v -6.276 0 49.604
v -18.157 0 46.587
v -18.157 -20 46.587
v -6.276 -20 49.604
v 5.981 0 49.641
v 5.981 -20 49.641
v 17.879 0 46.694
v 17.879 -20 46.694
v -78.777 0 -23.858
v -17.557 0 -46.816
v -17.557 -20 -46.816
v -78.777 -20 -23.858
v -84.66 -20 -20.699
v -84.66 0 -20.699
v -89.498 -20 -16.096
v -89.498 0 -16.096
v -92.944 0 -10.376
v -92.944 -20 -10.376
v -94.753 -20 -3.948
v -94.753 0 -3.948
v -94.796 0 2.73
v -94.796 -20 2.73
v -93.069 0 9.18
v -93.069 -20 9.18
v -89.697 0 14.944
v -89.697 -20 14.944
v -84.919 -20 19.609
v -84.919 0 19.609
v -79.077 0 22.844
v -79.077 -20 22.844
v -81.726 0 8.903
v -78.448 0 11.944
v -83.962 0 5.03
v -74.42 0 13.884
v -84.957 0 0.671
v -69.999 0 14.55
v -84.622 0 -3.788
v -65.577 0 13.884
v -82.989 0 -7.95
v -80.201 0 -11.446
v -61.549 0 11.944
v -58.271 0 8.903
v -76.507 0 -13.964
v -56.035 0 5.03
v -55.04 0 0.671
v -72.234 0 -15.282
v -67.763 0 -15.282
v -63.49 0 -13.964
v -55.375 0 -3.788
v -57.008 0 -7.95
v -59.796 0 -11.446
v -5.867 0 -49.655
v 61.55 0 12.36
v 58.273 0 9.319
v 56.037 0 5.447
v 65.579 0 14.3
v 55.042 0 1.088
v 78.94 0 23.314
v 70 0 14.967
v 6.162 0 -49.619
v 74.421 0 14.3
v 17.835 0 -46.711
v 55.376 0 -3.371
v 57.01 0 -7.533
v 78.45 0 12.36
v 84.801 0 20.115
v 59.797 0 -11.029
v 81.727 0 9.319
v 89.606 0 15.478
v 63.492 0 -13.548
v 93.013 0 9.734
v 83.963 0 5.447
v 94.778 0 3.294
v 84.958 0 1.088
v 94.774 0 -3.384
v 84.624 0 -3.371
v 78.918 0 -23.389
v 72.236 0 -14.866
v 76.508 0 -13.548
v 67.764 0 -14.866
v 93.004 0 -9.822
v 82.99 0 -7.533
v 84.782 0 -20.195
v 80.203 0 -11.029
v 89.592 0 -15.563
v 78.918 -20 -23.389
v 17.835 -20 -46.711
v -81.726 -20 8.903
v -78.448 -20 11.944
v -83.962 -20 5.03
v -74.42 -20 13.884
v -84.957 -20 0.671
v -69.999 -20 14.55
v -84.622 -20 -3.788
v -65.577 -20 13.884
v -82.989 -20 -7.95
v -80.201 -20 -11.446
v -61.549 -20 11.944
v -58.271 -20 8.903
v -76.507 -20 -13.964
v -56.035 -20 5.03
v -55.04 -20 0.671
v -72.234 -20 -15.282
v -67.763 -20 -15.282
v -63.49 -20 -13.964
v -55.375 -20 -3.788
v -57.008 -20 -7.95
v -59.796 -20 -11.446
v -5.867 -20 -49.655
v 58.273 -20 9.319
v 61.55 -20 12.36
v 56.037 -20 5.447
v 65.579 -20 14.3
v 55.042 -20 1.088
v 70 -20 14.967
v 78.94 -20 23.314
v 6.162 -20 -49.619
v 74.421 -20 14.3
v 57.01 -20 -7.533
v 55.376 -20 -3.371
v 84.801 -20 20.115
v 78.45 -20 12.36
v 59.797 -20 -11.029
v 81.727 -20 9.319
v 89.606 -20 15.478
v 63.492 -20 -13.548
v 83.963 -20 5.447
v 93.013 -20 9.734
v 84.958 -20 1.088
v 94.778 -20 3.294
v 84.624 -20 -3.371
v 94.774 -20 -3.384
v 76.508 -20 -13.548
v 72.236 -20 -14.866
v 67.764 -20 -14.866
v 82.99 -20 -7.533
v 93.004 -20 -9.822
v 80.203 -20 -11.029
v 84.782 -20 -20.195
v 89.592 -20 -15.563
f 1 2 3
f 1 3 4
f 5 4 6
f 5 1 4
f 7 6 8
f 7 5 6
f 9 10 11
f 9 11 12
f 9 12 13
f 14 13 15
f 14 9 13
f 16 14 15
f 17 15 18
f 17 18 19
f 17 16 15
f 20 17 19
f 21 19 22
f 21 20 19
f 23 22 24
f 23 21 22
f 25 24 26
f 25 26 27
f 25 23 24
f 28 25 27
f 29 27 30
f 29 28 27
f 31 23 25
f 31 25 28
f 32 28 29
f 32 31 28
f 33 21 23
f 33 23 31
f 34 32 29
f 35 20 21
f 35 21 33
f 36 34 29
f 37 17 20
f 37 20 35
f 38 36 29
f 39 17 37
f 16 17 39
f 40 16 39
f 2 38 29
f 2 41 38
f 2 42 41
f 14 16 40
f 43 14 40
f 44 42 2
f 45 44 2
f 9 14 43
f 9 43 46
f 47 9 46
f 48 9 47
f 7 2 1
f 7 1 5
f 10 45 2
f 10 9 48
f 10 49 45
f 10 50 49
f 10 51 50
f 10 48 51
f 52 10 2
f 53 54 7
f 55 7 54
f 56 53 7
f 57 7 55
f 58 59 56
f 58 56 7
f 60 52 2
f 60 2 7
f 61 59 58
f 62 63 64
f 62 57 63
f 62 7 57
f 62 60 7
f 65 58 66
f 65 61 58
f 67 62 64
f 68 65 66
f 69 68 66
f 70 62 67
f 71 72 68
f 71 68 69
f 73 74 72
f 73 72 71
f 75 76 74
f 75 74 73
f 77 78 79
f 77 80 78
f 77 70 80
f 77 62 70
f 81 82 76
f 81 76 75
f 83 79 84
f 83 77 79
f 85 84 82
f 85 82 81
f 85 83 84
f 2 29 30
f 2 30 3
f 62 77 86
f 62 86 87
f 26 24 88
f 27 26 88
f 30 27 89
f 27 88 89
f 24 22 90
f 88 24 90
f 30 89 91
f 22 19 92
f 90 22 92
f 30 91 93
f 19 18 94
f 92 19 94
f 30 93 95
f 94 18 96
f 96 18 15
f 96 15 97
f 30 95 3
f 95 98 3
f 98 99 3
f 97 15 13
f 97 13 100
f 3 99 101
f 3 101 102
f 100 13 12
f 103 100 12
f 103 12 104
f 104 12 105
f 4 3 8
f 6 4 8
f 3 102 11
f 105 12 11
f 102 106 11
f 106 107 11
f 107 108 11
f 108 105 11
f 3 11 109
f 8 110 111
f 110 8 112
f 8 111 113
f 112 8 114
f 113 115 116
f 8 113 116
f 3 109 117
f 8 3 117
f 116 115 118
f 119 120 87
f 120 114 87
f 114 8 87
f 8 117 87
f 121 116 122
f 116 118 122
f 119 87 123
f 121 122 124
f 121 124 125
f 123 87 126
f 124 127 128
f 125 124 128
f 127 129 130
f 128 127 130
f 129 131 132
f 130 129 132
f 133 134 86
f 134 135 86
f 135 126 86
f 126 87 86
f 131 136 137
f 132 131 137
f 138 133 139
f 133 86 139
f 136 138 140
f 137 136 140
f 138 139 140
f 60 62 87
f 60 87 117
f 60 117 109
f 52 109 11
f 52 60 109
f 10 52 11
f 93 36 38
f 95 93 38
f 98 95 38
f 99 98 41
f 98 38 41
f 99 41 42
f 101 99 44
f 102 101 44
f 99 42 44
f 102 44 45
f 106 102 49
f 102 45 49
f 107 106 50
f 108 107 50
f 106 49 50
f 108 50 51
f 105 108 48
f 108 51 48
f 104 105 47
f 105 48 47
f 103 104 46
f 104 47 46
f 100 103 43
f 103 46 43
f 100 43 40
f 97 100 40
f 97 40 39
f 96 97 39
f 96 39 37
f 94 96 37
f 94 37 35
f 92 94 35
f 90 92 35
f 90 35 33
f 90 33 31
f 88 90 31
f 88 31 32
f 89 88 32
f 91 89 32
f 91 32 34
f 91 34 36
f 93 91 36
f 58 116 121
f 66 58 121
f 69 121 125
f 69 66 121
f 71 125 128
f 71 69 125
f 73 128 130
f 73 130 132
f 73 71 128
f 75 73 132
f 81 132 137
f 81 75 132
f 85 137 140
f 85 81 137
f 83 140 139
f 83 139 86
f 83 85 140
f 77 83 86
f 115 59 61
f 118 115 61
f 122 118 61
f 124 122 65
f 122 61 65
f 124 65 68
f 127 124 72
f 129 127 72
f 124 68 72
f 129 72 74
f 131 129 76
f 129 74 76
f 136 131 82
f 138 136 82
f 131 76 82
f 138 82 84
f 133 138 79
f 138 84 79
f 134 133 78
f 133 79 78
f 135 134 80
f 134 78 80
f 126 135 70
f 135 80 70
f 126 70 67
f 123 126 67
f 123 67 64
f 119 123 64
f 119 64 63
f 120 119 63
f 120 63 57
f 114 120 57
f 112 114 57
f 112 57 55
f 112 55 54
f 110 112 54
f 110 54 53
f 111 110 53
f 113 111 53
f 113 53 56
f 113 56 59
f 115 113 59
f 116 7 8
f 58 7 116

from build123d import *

# Parameters (mm, degrees)
EXTRUDE_324_DEPTH  = 20
SKETCH1_R          = 15
CUT_EXTRUDE1_DEPTH = 110.201641513


with BuildPart() as part:
    # Эскиз1 → Extrude 324 (new body)
    with BuildSketch(Plane(origin=(0, 0, 0), x_dir=(-1, 0, 0), z_dir=(0, -1, 0))):
        with BuildLine():
            Line((-78.917505692, 23.388614652), (-17.835027079, 46.710938859))
            ThreePointArc((-17.835027079, 46.710938859), (-0.148812417, 49.999778548), (17.556665634, 46.816273793))
            Line((17.556665634, 46.816273793), (78.776887546, 23.857954408))
            ThreePointArc((78.776887546, 23.857954408), (94.998038561, 0.610466623), (79.076996078, -22.84357002))
            Line((79.076996078, -22.84357002), (18.156882698, -46.586775062))
            ThreePointArc((18.156882698, -46.586775062), (0.148812417, -49.999778548), (-17.879254632, -46.694028031))
            Line((-17.879254632, -46.694028031), (-78.939619469, -23.313868793))
            ThreePointArc((-78.939619469, -23.313868793), (-94.99998935, 0.044982802), (-78.917505692, 23.388614652))
        make_face()
    extrude(amount=EXTRUDE_324_DEPTH)

    # Sketch1 → Cut-Extrude1 (cut, through all)
    with BuildSketch(Plane(origin=(0, 0, 0), x_dir=(1, 0, 0), z_dir=(0, 1, 0))):
        with Locations(Location((-69.998554729, 0.449817511, 0), (0, 0, 270))):
            Circle(SKETCH1_R)
        with Locations(Location((69.999992153, 0.033145222, 0), (0, 0, 270))):
            Circle(SKETCH1_R)
    extrude(amount=-CUT_EXTRUDE1_DEPTH, mode=Mode.SUBTRACT)


solid = part.part
